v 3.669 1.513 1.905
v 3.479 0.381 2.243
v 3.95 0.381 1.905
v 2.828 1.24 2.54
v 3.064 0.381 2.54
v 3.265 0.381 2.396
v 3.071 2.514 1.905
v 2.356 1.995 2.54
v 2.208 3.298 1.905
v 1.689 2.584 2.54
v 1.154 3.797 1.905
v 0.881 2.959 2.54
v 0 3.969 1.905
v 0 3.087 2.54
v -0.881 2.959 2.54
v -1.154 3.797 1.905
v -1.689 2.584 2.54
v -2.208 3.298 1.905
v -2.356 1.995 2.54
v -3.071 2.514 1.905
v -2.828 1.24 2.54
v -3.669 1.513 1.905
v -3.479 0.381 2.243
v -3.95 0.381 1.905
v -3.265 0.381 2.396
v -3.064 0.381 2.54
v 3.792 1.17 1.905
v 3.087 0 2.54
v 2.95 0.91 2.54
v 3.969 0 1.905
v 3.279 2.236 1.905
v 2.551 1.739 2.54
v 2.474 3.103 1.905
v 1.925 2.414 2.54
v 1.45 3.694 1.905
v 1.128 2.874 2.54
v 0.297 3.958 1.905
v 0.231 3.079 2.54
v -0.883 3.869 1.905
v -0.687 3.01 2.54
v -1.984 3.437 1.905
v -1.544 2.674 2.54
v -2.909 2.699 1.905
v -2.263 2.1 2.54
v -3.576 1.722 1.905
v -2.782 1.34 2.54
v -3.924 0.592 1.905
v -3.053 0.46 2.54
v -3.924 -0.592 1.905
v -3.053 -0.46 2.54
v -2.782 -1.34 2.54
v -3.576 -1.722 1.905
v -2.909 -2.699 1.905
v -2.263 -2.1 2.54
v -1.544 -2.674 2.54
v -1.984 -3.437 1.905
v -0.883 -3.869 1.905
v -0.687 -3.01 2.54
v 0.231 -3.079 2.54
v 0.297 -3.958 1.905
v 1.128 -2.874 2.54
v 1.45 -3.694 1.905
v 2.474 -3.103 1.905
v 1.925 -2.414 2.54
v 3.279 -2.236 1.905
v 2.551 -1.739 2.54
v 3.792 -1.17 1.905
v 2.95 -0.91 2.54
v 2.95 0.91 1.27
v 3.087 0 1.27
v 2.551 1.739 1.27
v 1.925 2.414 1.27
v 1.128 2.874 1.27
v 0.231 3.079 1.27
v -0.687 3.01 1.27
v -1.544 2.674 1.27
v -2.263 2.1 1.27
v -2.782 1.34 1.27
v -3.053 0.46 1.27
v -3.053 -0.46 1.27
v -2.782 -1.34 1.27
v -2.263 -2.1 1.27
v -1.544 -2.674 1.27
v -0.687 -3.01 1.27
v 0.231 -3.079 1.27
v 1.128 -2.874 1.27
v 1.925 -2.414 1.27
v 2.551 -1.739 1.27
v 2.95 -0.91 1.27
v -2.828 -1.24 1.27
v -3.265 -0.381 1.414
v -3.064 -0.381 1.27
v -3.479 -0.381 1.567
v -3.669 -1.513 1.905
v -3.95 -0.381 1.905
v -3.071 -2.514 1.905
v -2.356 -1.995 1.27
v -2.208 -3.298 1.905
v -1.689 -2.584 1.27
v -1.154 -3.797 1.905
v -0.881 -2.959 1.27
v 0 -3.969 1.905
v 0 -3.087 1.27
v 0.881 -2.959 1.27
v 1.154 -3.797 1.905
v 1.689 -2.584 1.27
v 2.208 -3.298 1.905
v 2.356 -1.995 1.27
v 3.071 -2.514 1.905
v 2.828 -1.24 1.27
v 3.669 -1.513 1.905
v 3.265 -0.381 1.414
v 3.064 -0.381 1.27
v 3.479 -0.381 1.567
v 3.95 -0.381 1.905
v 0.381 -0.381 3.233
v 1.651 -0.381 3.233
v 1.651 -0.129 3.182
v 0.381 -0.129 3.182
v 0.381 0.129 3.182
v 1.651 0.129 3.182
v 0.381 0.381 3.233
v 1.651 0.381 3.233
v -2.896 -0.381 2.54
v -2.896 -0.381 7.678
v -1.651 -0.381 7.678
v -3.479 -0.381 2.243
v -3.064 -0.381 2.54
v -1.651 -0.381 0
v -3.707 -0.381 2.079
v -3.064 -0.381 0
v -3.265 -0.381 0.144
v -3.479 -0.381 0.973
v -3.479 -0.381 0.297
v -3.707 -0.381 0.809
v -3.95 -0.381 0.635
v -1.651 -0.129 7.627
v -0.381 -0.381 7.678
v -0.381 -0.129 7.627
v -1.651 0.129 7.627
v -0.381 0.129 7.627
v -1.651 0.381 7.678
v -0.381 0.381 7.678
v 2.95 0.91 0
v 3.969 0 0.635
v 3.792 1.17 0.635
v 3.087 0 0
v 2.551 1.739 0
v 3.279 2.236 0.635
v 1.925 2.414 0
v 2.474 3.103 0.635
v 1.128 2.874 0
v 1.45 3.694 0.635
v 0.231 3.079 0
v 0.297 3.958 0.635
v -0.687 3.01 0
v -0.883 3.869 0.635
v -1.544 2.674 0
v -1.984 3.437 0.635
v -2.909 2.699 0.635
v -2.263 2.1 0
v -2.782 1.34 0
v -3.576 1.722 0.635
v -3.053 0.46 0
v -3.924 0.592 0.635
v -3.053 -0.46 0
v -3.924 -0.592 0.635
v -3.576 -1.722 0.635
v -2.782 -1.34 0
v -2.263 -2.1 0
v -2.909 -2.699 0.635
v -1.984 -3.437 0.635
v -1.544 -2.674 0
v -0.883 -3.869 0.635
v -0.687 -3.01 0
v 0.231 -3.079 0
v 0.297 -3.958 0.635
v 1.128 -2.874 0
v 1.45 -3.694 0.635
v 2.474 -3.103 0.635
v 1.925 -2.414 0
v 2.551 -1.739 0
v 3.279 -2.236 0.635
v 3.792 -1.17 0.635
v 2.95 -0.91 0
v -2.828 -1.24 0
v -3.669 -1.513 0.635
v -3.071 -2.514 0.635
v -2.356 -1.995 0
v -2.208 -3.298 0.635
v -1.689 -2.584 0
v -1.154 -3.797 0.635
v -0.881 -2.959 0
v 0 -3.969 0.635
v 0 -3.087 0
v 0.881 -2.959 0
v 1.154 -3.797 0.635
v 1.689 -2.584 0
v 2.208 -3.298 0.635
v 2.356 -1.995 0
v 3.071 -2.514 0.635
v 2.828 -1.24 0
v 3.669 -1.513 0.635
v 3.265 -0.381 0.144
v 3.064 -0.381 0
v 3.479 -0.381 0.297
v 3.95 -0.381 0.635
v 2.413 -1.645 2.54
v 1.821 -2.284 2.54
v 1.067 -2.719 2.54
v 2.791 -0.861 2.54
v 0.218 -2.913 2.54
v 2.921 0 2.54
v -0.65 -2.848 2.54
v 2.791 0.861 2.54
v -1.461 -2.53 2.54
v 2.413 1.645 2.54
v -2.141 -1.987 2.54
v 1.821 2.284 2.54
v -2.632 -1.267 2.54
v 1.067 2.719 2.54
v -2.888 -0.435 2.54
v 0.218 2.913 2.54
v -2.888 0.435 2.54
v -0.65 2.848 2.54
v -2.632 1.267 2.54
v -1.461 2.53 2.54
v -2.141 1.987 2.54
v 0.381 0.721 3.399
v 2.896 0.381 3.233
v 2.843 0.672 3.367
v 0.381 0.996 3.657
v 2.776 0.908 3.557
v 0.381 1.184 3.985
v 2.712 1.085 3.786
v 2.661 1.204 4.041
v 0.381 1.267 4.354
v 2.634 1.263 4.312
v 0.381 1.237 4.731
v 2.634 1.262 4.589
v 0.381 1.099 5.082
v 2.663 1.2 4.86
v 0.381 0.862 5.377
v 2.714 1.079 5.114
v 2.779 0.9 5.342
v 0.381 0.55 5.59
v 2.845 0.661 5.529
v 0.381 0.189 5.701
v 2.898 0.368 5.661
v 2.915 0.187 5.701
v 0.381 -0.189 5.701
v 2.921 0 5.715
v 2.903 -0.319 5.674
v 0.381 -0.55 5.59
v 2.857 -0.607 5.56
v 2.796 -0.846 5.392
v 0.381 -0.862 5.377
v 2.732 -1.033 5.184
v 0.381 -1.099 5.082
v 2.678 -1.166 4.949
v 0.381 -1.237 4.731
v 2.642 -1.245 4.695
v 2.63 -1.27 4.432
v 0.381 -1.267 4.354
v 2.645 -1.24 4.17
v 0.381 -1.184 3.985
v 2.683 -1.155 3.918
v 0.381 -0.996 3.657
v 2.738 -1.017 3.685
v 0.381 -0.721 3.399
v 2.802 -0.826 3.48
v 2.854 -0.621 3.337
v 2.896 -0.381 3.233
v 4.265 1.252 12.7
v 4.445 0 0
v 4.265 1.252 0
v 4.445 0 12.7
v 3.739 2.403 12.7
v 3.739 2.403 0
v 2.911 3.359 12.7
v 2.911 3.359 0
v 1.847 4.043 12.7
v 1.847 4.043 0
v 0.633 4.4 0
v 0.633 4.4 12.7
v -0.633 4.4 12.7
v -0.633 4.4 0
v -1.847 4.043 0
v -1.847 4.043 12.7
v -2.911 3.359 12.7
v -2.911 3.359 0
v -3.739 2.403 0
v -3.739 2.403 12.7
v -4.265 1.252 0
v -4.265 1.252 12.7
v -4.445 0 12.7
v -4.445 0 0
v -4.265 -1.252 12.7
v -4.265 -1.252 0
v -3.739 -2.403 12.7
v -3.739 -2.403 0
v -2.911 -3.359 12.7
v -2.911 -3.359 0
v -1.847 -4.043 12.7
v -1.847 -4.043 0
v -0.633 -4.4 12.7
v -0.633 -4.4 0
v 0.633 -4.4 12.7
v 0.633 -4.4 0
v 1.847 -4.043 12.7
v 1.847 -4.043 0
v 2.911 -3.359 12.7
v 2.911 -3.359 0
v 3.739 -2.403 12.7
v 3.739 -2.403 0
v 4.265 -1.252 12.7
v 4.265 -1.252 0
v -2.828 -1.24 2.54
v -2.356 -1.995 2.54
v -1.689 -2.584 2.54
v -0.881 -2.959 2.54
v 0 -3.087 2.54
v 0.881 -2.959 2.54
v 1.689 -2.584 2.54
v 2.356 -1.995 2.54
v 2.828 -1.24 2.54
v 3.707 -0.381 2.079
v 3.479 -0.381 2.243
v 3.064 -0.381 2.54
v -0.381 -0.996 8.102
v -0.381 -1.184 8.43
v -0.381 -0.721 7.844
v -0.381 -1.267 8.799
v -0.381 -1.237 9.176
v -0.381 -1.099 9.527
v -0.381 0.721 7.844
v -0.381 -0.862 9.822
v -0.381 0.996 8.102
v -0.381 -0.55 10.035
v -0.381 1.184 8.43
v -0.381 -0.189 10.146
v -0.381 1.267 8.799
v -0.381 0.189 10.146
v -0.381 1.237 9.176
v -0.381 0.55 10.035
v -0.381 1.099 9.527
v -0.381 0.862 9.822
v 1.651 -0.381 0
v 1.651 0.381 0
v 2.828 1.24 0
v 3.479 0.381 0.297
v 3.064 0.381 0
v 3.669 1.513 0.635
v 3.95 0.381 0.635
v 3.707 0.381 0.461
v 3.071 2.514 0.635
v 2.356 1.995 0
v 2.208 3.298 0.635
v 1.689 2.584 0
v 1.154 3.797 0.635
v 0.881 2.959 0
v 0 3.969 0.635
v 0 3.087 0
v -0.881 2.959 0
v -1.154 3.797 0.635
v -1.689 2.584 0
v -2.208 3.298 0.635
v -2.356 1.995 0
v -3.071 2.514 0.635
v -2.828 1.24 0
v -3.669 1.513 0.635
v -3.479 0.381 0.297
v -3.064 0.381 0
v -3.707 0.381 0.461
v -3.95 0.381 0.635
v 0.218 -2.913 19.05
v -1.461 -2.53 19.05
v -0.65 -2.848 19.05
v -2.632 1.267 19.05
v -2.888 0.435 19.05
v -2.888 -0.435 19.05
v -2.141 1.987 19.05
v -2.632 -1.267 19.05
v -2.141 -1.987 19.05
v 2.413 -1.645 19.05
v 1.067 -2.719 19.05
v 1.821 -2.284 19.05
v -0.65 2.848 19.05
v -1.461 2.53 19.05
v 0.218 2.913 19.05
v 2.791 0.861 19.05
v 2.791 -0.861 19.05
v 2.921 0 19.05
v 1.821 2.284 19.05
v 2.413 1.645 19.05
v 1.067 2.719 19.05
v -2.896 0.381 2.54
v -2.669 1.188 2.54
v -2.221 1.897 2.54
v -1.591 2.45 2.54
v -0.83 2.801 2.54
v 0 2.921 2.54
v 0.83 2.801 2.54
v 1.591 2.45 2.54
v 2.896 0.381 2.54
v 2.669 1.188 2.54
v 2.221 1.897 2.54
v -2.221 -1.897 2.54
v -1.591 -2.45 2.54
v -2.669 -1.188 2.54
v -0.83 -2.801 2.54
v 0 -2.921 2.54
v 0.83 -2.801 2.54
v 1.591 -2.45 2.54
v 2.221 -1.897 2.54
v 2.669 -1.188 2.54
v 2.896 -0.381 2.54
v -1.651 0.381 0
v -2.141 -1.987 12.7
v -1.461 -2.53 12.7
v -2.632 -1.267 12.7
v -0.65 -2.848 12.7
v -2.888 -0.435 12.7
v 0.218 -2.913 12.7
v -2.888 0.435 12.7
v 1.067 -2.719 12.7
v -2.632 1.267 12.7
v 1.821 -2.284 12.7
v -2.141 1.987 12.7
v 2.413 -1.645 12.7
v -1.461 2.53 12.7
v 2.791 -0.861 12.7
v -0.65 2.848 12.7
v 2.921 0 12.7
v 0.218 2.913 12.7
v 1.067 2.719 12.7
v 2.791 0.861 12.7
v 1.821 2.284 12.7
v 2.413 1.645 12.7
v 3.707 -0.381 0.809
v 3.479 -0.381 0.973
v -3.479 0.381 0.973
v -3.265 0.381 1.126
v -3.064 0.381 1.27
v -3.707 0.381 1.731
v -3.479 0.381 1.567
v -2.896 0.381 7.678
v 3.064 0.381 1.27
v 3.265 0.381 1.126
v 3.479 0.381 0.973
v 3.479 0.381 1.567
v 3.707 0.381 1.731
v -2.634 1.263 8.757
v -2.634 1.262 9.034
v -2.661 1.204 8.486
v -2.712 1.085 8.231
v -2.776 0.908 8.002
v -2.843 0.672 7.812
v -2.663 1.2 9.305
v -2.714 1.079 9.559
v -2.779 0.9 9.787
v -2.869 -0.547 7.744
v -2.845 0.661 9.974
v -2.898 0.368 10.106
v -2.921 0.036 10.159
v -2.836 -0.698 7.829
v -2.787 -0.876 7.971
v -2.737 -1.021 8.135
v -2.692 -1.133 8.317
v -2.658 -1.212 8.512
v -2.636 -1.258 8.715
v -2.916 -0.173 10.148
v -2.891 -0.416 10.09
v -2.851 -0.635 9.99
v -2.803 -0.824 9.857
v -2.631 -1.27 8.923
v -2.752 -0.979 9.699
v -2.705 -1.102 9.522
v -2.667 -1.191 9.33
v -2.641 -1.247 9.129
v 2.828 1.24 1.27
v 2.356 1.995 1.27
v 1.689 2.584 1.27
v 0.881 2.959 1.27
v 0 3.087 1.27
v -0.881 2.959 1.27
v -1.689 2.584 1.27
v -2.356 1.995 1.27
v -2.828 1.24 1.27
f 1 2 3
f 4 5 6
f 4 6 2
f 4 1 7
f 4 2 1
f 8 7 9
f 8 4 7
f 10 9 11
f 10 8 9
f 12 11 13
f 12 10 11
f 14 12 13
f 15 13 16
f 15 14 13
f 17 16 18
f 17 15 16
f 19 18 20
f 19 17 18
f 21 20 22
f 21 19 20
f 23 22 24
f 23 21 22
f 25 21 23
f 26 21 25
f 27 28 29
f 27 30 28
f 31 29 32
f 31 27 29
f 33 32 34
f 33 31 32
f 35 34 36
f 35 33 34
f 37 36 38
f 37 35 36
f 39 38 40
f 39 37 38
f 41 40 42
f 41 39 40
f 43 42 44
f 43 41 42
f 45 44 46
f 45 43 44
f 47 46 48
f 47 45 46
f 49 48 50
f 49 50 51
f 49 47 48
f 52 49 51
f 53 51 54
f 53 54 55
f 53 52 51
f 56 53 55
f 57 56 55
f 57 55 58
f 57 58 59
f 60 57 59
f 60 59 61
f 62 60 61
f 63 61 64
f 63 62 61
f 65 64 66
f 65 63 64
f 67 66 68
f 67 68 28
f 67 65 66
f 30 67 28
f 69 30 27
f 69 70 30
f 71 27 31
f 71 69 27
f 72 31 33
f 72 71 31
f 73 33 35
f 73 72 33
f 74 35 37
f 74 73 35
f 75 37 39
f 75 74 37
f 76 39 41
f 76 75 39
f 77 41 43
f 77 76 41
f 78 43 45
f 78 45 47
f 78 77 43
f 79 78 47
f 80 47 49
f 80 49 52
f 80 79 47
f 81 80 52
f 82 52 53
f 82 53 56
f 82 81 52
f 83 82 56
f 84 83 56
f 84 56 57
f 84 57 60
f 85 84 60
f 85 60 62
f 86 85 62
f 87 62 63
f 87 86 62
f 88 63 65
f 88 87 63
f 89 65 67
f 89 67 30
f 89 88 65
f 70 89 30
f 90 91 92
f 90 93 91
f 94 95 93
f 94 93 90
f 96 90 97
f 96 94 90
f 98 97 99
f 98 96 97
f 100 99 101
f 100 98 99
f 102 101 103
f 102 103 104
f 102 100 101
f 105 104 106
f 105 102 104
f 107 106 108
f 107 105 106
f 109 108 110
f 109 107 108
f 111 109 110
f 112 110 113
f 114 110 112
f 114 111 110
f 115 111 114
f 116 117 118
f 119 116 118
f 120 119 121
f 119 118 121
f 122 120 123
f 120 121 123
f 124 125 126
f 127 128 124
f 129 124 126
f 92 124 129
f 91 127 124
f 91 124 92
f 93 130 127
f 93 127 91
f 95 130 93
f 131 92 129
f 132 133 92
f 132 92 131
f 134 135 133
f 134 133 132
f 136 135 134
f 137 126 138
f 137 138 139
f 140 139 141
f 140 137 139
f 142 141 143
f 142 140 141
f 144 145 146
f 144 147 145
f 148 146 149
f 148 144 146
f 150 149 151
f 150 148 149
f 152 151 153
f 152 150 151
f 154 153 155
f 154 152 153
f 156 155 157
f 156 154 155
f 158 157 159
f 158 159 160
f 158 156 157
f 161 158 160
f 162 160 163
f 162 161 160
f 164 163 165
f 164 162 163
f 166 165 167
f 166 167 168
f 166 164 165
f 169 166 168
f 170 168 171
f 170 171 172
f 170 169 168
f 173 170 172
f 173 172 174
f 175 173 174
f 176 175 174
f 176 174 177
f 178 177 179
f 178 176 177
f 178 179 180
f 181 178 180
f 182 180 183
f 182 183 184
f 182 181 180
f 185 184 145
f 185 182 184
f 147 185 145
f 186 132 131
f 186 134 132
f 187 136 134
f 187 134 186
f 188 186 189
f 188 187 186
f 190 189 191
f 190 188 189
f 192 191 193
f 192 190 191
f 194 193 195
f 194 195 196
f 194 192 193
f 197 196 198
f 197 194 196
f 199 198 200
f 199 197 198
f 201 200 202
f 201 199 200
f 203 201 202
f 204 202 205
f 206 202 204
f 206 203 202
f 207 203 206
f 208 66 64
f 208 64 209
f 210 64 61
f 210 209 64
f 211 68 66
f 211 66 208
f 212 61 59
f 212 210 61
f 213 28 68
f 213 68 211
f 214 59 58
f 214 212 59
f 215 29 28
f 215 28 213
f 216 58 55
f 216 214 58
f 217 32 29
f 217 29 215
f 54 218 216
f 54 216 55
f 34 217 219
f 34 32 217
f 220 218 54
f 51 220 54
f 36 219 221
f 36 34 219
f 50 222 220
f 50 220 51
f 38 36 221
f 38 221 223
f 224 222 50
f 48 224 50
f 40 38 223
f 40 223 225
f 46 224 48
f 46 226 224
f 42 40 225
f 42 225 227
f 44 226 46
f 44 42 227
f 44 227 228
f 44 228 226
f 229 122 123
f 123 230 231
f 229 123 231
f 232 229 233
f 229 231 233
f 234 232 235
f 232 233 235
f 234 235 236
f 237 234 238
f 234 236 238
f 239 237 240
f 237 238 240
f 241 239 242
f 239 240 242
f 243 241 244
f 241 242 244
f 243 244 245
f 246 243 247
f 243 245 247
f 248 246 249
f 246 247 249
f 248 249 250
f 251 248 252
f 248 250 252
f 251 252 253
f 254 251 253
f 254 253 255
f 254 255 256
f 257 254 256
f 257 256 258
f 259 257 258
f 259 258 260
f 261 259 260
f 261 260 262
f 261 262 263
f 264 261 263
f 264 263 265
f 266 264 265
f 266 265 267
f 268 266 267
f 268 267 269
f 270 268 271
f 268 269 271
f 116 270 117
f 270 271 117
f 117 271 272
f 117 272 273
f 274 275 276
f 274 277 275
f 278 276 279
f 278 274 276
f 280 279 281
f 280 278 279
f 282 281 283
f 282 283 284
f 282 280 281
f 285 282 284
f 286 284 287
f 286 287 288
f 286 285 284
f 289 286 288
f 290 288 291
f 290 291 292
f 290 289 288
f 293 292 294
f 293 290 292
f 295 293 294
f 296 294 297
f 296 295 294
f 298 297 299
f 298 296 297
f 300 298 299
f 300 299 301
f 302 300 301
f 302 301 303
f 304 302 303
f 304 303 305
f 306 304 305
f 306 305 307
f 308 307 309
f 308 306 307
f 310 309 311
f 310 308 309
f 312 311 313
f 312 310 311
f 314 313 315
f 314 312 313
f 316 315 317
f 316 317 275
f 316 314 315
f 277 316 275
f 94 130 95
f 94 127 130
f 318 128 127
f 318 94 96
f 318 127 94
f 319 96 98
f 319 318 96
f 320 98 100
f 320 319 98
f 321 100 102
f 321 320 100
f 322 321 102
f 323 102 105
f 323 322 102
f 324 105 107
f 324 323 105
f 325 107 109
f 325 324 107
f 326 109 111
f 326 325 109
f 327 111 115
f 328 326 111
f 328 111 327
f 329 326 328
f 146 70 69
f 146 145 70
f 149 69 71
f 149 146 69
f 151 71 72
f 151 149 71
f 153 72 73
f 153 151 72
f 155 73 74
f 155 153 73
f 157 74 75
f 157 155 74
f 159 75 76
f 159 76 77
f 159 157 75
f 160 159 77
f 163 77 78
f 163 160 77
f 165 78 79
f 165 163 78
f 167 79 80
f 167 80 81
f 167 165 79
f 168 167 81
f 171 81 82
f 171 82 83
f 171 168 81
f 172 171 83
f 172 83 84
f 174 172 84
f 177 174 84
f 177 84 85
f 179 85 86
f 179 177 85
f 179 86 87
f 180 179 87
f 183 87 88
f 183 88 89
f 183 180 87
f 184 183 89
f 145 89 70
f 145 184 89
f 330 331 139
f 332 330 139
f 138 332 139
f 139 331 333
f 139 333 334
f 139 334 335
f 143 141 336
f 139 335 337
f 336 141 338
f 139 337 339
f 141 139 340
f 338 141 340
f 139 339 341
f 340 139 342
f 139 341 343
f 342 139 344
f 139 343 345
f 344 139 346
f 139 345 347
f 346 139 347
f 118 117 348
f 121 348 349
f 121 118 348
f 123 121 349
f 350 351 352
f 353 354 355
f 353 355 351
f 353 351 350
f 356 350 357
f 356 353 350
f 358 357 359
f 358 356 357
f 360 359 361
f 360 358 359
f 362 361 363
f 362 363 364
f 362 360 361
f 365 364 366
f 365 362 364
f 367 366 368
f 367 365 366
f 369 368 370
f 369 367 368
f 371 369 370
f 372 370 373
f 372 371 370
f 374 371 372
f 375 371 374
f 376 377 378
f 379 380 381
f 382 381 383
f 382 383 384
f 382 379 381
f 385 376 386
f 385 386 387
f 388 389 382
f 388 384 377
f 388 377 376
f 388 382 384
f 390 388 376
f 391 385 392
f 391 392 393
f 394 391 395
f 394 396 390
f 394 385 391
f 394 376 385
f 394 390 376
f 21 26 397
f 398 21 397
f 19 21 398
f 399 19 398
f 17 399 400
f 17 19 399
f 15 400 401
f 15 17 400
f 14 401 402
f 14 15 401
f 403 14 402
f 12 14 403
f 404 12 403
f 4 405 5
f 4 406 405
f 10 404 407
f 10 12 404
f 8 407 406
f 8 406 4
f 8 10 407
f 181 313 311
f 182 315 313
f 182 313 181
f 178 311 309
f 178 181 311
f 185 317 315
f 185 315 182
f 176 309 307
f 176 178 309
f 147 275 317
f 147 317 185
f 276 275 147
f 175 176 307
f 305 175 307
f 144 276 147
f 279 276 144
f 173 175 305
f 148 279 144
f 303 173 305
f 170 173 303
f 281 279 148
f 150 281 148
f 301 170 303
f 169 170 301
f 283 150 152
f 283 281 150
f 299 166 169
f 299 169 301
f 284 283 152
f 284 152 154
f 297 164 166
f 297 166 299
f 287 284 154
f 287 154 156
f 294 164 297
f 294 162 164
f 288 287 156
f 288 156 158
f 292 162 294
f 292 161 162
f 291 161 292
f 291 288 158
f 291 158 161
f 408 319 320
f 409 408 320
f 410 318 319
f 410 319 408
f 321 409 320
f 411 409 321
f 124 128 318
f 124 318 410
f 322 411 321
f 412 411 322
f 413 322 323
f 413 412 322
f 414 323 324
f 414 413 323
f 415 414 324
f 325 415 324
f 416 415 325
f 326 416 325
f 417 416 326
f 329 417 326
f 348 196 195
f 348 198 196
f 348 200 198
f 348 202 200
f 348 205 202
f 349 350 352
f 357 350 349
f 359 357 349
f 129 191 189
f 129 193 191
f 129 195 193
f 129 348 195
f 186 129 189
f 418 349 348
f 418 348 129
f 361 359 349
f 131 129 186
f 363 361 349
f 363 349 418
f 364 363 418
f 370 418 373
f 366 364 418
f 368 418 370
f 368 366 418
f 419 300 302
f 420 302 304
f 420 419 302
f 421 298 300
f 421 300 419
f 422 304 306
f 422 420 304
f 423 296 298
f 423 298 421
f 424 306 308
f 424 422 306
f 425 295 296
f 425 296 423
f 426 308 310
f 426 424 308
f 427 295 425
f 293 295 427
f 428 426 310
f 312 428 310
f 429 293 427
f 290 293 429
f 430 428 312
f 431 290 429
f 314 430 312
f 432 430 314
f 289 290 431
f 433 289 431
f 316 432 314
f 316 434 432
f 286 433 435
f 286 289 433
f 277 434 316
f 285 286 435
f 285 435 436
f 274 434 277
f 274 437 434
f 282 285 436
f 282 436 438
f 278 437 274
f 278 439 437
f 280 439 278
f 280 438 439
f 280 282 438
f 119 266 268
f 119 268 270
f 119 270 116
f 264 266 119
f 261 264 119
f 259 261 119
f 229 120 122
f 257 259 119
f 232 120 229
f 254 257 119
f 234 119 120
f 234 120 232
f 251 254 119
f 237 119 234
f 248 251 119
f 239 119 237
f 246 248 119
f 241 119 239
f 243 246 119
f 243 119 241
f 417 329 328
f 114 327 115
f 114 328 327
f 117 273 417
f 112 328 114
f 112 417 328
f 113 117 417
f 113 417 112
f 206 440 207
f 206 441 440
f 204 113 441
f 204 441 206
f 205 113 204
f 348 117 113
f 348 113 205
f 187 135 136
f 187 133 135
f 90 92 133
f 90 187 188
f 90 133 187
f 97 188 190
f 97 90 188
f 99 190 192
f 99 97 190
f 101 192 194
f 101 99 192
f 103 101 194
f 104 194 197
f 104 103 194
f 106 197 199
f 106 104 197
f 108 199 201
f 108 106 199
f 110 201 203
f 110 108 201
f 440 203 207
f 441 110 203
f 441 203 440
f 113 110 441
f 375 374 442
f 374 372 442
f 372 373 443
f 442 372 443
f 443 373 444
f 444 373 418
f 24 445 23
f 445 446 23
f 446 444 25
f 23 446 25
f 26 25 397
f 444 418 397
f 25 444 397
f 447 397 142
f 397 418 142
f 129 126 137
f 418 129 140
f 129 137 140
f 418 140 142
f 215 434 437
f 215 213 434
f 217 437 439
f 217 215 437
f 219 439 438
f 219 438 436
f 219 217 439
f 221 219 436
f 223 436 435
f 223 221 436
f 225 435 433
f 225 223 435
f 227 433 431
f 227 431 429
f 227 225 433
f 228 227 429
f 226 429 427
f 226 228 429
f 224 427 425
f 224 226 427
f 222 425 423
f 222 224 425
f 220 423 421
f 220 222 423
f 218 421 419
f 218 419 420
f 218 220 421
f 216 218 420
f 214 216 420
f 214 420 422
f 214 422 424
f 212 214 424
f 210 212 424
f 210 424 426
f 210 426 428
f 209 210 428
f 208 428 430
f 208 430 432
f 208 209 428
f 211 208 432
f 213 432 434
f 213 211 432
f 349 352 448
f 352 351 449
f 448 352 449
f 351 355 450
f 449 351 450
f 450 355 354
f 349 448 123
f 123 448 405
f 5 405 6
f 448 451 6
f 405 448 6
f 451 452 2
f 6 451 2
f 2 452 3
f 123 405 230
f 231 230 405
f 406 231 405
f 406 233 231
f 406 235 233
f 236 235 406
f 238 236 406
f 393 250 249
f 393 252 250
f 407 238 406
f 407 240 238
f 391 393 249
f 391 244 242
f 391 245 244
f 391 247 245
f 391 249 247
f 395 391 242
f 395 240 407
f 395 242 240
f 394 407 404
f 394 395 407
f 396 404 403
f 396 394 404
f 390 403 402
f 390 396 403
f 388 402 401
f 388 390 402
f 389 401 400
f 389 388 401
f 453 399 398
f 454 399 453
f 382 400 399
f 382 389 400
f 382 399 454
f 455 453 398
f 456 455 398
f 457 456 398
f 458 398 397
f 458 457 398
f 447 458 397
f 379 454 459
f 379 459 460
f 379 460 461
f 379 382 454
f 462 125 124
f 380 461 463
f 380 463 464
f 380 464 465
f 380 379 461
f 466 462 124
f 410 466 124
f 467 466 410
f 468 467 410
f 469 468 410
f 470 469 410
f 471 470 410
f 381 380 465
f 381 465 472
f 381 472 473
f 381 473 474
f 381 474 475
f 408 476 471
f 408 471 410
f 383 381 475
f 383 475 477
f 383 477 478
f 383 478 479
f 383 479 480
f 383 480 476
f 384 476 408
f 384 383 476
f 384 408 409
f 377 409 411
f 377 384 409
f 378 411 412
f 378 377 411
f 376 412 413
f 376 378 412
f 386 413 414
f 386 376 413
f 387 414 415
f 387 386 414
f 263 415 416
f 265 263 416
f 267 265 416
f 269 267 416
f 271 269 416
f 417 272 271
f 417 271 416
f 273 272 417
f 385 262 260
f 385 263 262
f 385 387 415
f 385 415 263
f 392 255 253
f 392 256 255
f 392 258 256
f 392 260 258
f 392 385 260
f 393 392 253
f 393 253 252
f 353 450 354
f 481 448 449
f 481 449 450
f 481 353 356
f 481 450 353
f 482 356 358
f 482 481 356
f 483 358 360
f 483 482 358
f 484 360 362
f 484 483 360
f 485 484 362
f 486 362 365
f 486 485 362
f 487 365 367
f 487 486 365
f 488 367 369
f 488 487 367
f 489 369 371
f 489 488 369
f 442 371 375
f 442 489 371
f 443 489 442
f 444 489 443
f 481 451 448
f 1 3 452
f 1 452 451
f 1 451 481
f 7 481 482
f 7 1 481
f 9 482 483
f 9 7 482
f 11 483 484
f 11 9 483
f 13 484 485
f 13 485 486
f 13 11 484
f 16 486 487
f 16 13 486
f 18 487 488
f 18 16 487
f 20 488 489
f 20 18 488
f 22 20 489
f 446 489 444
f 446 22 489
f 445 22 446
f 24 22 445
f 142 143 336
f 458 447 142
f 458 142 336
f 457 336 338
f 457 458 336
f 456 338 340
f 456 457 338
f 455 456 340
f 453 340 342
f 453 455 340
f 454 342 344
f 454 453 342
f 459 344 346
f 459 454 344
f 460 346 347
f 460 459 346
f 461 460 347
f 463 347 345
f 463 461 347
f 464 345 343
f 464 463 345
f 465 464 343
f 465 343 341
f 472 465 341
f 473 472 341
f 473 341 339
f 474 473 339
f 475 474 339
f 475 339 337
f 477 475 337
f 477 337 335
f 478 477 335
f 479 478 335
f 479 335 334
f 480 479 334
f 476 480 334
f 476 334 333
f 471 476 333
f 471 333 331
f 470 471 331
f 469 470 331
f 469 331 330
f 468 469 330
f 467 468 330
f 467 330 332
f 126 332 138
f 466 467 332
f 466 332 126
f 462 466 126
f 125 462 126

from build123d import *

# Parameters (mm, degrees)
F4_DEPTH      = 2.54
F5_DEPTH      = 1.27
F5_DEPTH_BACK = 1.04875
F8_DEPTH      = 2.54
F9_DEPTH      = 1.27
F9_DEPTH_BACK = 1.04875


with BuildPart() as f1:
    # F0 (on Front) → F1 (revolve)
    with BuildSketch(Plane.XZ):
        Polygon((0, 19.05), (0, 0), (3.08737, 0), (3.96875, 0.635), (3.08737, 1.27), (3.96875, 1.905), (3.08737, 2.54), (2.921, 2.54), (2.921, 12.7), (2.921, 19.05), align=None)
    revolve(axis=Axis((0, 0, 9.525), (0, 0, 1)))

    # F3 (on offset) → F4 (cut)
    with BuildSketch(Plane.YZ.offset(2.921)):
        with BuildLine():
            ThreePointArc((0.381, 3.2334972142), (1.023906734, 3.6936578675), (1.27, 4.445))
            ThreePointArc((1.27, 4.445), (-0.7513421325, 5.468906734), (-0.381, 3.2334972142))
            ThreePointArc((-0.381, 3.2334972142), (0, 3.175), (0.381, 3.2334972142))
        make_face()
    extrude(amount=-F4_DEPTH, mode=Mode.SUBTRACT)

    # F3 (on offset) → F5 (cut, two sides)
    with BuildSketch(Plane.YZ.offset(2.921)) as f5_sk:
        with BuildLine():
            ThreePointArc((0.381, 3.2334972142), (0, 3.175), (-0.381, 3.2334972142))
            Line((-0.381, 3.2334972142), (-0.381, 0))
            Line((-0.381, 0), (0.381, 0))
            Line((0.381, 0), (0.381, 3.2334972142))
        make_face()
    extrude(amount=-F5_DEPTH, mode=Mode.SUBTRACT)
    extrude(f5_sk.sketch, amount=F5_DEPTH_BACK, mode=Mode.SUBTRACT)

    # F7 (on offset) → F8 (cut)
    with BuildSketch(Plane.YZ.offset(-2.921)):
        with BuildLine():
            ThreePointArc((0.381, 7.6784972142), (1.023906734, 8.1386578675), (1.27, 8.89))
            ThreePointArc((1.27, 8.89), (-0.7513421325, 9.913906734), (-0.381, 7.6784972142))
            ThreePointArc((-0.381, 7.6784972142), (0, 7.62), (0.381, 7.6784972142))
        make_face()
    extrude(amount=F8_DEPTH, mode=Mode.SUBTRACT)

    # F7 (on offset) → F9 (cut, two sides)
    with BuildSketch(Plane.YZ.offset(-2.921)) as f9_sk:
        with BuildLine():
            ThreePointArc((0.381, 7.6784972142), (0, 7.62), (-0.381, 7.6784972142))
            Line((-0.381, 7.6784972142), (-0.381, 0))
            Line((-0.381, 0), (0.381, 0))
            Line((0.381, 0), (0.381, 7.6784972142))
        make_face()
    extrude(amount=F9_DEPTH, mode=Mode.SUBTRACT)
    extrude(f9_sk.sketch, amount=-F9_DEPTH_BACK, mode=Mode.SUBTRACT)


with BuildPart() as f10:
    # F0 (on Front) → F10 (revolve)
    with BuildSketch(Plane.XZ):
        Polygon((3.96875, 0.635), (3.08737, 0), (4.445, 0), (4.445, 12.7), (2.921, 12.7), (2.921, 2.54), (3.08737, 2.54), (3.96875, 1.905), (3.08737, 1.27), align=None)
    revolve(axis=Axis((0, 0, 9.525), (0, 0, 1)))


solid = Compound([f1.part, f10.part])
